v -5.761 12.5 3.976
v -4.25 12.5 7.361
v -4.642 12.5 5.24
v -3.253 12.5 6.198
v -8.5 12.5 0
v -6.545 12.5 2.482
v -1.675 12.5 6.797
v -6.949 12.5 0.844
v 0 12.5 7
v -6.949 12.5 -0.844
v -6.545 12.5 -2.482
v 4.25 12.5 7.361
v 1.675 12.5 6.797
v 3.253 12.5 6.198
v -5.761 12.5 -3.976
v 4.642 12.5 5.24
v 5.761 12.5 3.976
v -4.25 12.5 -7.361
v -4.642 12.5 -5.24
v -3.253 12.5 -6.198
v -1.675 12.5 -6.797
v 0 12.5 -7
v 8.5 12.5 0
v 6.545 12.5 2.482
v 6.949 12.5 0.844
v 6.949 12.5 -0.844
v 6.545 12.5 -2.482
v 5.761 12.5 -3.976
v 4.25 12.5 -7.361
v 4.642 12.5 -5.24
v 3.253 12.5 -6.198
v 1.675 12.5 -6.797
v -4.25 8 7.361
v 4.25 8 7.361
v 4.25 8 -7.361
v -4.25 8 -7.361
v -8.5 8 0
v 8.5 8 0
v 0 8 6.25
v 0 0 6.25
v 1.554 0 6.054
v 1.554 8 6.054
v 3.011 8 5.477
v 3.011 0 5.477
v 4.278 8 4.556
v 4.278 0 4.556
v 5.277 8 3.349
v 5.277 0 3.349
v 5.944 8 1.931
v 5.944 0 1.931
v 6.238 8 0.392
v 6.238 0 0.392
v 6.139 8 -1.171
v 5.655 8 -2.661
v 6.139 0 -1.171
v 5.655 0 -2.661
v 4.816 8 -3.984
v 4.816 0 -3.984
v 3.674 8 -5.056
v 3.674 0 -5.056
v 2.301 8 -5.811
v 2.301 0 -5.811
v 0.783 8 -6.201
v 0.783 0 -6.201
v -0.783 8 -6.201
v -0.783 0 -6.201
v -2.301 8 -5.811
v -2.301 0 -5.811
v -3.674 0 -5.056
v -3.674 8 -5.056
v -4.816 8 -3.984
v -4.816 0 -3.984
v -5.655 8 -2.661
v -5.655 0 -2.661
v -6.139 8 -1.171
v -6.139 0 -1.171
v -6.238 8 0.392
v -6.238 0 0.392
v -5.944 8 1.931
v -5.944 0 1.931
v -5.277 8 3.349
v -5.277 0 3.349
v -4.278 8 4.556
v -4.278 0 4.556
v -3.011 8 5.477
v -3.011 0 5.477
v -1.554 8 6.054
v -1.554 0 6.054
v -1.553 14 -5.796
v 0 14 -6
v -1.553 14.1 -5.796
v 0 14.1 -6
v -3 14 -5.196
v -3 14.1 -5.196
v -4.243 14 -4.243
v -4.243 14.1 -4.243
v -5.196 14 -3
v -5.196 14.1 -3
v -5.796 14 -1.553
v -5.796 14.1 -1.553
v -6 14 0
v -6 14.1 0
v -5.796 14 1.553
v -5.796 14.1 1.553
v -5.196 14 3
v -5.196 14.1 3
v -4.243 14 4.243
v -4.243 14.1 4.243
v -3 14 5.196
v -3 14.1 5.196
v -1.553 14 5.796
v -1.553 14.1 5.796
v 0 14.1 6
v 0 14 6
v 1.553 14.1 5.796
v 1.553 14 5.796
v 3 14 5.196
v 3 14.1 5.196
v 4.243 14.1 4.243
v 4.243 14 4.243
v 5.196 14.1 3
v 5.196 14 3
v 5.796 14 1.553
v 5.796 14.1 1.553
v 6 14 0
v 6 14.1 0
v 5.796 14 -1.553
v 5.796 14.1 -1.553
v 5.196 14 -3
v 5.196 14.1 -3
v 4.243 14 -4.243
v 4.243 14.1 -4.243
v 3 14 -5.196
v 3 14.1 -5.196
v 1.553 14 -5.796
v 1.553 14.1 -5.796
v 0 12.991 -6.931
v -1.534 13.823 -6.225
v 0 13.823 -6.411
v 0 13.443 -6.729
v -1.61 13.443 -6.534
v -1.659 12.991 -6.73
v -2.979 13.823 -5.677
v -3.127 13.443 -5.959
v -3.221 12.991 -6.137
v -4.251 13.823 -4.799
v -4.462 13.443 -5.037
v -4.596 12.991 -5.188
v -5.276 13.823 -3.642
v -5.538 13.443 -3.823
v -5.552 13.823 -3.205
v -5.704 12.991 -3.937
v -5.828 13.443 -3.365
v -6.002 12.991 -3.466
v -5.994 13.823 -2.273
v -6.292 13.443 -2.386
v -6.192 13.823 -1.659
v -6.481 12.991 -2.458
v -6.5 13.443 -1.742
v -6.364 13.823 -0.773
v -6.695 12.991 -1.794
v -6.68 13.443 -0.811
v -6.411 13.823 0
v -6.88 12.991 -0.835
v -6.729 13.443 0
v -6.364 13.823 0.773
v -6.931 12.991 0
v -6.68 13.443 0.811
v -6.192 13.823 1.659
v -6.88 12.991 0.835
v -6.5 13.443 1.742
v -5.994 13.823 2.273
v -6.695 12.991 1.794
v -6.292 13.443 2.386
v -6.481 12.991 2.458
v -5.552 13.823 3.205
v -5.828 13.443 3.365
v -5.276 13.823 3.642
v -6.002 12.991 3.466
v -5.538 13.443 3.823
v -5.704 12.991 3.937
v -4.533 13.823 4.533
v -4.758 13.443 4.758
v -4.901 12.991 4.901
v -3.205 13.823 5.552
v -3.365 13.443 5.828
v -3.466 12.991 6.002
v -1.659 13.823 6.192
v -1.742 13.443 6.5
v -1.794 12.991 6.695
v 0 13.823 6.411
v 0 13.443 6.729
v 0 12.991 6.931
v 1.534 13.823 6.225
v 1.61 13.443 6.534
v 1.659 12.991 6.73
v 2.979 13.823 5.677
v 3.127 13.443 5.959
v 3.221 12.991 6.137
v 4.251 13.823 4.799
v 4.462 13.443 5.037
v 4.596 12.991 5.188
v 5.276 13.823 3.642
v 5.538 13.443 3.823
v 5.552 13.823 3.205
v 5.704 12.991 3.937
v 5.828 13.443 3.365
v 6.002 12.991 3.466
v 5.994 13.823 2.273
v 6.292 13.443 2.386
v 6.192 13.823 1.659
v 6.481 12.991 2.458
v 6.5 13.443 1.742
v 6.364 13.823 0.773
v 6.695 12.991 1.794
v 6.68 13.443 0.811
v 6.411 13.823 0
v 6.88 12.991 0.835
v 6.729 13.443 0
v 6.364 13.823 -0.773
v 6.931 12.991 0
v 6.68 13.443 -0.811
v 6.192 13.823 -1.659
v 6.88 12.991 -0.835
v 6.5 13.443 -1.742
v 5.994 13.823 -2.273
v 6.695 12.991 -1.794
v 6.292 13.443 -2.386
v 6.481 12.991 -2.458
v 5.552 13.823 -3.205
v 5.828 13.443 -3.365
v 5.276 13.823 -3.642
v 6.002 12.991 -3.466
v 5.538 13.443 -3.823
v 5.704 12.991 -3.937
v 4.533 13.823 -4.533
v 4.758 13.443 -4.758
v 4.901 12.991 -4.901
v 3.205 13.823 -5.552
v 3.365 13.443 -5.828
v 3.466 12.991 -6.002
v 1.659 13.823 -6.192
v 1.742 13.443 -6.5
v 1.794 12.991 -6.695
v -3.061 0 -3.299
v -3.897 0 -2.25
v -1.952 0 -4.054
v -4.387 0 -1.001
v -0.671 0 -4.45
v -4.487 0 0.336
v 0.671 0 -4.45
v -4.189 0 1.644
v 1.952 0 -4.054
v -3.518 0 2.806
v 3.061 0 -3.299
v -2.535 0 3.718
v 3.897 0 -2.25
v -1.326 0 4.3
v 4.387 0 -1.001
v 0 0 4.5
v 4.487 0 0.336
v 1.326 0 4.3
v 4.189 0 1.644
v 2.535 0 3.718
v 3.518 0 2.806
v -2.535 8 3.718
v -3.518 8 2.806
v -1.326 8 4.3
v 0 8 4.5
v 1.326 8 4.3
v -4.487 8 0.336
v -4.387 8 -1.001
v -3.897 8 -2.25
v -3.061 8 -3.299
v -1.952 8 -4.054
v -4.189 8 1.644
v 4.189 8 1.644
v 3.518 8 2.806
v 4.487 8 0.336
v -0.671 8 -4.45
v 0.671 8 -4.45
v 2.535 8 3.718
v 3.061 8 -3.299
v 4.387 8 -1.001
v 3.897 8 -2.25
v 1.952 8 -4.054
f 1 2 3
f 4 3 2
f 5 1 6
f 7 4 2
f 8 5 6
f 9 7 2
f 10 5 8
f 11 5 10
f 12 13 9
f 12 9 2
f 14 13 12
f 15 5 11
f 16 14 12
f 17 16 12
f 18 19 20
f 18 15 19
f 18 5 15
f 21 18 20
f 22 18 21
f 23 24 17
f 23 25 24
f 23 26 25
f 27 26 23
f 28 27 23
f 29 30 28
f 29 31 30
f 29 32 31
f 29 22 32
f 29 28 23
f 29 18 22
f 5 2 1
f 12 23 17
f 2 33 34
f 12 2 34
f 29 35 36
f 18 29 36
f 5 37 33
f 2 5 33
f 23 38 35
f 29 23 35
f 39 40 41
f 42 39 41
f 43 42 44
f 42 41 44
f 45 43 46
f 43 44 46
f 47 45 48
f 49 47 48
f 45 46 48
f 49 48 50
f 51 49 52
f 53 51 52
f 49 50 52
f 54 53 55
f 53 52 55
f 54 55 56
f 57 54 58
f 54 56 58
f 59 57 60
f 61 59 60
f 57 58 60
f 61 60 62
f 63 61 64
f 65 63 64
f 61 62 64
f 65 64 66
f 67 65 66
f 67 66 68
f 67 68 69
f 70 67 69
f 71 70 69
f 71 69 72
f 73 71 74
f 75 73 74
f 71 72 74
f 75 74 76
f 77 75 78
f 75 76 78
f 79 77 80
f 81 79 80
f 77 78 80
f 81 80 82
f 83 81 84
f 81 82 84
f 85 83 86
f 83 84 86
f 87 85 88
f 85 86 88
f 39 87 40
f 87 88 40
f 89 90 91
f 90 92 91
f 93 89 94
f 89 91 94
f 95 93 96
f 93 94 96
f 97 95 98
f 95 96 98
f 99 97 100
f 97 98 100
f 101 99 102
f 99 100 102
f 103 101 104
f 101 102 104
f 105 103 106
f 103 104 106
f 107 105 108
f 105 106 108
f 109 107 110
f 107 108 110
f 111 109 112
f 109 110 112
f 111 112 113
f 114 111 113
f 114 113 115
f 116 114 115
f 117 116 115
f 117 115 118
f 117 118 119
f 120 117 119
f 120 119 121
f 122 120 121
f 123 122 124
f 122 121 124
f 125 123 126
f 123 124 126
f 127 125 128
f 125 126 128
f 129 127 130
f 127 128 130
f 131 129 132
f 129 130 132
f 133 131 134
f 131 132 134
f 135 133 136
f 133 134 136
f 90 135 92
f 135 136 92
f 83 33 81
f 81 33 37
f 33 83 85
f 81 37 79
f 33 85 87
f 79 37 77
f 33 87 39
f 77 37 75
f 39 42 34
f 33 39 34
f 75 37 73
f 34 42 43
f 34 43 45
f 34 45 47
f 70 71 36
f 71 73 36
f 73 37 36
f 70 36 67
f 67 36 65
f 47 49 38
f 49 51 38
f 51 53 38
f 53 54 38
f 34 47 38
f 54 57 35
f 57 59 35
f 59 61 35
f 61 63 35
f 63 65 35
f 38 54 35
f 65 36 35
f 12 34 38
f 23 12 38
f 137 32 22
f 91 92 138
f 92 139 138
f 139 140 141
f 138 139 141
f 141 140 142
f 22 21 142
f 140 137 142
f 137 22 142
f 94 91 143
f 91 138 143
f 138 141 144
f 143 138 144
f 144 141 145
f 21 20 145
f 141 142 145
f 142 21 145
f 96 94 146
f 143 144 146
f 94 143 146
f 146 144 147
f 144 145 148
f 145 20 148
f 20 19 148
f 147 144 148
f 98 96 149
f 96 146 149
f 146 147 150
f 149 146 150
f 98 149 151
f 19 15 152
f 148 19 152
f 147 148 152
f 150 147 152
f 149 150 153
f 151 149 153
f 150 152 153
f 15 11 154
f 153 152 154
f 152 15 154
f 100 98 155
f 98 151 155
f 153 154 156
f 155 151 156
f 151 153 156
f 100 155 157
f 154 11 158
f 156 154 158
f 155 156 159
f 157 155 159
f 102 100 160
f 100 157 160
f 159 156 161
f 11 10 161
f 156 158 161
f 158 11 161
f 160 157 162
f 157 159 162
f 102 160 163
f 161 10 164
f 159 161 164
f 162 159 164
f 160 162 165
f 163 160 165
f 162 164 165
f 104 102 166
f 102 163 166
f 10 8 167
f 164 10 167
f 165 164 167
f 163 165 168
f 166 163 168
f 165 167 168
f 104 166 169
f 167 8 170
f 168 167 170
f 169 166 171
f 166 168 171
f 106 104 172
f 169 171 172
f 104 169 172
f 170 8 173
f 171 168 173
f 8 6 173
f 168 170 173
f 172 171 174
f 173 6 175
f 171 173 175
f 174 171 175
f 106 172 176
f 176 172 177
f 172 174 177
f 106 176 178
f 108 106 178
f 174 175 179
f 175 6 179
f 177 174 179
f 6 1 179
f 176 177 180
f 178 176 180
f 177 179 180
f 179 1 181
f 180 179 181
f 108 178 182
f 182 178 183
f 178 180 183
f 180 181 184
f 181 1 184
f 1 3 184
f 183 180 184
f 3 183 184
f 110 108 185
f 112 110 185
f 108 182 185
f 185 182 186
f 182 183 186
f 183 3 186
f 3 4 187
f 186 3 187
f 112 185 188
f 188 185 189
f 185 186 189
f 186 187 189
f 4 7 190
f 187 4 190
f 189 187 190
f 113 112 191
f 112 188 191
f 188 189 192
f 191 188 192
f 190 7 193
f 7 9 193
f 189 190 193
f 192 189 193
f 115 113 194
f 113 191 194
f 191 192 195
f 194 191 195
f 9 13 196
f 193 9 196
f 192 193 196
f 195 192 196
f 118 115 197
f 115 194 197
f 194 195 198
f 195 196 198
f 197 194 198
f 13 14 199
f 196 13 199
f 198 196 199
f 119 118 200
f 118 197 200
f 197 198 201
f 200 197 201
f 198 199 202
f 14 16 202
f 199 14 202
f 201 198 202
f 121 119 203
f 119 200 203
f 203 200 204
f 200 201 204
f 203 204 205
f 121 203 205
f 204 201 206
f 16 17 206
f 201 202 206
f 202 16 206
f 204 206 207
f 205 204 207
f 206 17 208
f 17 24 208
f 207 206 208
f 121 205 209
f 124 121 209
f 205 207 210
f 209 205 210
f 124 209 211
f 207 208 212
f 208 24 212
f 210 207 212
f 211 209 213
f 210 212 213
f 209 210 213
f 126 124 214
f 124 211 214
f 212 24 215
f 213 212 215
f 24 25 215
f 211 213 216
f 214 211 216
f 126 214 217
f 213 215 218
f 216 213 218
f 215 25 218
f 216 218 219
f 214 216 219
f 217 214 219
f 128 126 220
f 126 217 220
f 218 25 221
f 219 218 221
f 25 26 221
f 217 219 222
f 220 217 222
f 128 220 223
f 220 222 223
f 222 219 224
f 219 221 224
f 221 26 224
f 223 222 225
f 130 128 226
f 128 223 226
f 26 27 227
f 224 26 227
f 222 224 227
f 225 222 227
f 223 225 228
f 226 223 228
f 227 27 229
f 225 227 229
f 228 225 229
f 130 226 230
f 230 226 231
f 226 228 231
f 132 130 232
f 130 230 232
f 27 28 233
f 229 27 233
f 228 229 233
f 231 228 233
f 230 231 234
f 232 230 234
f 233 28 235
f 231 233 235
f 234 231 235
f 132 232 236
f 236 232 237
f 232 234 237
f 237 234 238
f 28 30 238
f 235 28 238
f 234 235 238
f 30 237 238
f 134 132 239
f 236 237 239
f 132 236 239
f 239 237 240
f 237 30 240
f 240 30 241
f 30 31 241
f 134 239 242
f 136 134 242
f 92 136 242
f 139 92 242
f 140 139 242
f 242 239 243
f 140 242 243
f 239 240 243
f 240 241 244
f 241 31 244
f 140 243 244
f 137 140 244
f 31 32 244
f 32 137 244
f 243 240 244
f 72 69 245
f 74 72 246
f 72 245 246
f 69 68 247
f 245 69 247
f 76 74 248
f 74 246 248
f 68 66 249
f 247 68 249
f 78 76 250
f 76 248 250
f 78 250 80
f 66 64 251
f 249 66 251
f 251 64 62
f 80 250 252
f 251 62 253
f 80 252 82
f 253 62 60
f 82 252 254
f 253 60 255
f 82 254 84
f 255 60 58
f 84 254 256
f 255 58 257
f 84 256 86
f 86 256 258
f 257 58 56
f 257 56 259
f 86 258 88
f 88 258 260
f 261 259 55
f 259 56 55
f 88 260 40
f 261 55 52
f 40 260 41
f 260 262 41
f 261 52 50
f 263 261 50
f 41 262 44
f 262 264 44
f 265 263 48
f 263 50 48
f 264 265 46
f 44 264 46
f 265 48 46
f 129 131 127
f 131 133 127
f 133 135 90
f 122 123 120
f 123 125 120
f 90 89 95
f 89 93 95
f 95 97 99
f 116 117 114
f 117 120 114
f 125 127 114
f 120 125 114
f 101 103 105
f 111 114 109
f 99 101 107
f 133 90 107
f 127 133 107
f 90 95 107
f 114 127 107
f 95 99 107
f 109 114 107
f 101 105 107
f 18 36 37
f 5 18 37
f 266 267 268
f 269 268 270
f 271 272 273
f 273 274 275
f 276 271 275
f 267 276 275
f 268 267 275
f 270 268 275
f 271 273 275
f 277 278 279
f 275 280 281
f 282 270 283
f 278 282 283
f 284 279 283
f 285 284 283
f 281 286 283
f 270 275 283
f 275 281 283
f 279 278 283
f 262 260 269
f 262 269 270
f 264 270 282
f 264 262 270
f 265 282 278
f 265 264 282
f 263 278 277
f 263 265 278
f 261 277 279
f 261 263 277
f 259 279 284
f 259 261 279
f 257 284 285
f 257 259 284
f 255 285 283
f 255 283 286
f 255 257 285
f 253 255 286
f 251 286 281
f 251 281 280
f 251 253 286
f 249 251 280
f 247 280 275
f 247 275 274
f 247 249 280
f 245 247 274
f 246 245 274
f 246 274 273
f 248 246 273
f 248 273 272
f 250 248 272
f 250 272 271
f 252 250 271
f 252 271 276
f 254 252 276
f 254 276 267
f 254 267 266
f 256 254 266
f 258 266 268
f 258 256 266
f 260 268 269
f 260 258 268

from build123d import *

# Parameters (mm, degrees)
SKETCH_1_R      = 6.25
SKETCH_1_R_2    = 4.5
EXTRUDE_1_DEPTH = 8
EXTRUDE_2_DEPTH = 4.5


with BuildPart() as part:
    # 草图1 → 凸台-拉伸1 (new body)
    with BuildSketch(Plane(origin=(0, 0, 0), x_dir=(1, 0, 0), z_dir=(0, 1, 0))):
        with Locations(Location((0, 0, 0), (0, 0, 270))):
            Circle(SKETCH_1_R)
        with Locations(Location((0, 0, 0), (0, 0, 270))):
            Circle(SKETCH_1_R_2, mode=Mode.SUBTRACT)
    extrude(amount=EXTRUDE_1_DEPTH)

    # 草图2 → 凸台-拉伸2 (add)
    with BuildSketch(Plane(origin=(0, 8, 0), x_dir=(1, 0, 0), z_dir=(0, 1, 0))):
        Polygon((4.25, 7.361215932), (-4.25, 7.361215932), (-8.5, 0), (-4.25, -7.361215932), (4.25, -7.361215932), (8.5, 0), align=None)
    extrude(amount=EXTRUDE_2_DEPTH)

    # 草图3 → 旋转1 (revolve)
    with BuildSketch(Plane.XY, mode=Mode.PRIVATE) as revolve_1_sk:
        with BuildLine():
            ThreePointArc((6, 14.1), (6.729436981, 13.443398113), (7, 12.5))
            Line((7, 12.5), (0, 12.5))
            Line((0, 12.5), (0, 14))
            Line((0, 14), (6, 14))
            Line((6, 14), (6, 14.1))
        make_face()
    revolve(revolve_1_sk.sketch.rotate(Axis((0, -20.81110882, 0), (0, 1, 0)), 90), axis=Axis((0, -20.81110882, 0), (0, 1, 0)))


solid = part.part
